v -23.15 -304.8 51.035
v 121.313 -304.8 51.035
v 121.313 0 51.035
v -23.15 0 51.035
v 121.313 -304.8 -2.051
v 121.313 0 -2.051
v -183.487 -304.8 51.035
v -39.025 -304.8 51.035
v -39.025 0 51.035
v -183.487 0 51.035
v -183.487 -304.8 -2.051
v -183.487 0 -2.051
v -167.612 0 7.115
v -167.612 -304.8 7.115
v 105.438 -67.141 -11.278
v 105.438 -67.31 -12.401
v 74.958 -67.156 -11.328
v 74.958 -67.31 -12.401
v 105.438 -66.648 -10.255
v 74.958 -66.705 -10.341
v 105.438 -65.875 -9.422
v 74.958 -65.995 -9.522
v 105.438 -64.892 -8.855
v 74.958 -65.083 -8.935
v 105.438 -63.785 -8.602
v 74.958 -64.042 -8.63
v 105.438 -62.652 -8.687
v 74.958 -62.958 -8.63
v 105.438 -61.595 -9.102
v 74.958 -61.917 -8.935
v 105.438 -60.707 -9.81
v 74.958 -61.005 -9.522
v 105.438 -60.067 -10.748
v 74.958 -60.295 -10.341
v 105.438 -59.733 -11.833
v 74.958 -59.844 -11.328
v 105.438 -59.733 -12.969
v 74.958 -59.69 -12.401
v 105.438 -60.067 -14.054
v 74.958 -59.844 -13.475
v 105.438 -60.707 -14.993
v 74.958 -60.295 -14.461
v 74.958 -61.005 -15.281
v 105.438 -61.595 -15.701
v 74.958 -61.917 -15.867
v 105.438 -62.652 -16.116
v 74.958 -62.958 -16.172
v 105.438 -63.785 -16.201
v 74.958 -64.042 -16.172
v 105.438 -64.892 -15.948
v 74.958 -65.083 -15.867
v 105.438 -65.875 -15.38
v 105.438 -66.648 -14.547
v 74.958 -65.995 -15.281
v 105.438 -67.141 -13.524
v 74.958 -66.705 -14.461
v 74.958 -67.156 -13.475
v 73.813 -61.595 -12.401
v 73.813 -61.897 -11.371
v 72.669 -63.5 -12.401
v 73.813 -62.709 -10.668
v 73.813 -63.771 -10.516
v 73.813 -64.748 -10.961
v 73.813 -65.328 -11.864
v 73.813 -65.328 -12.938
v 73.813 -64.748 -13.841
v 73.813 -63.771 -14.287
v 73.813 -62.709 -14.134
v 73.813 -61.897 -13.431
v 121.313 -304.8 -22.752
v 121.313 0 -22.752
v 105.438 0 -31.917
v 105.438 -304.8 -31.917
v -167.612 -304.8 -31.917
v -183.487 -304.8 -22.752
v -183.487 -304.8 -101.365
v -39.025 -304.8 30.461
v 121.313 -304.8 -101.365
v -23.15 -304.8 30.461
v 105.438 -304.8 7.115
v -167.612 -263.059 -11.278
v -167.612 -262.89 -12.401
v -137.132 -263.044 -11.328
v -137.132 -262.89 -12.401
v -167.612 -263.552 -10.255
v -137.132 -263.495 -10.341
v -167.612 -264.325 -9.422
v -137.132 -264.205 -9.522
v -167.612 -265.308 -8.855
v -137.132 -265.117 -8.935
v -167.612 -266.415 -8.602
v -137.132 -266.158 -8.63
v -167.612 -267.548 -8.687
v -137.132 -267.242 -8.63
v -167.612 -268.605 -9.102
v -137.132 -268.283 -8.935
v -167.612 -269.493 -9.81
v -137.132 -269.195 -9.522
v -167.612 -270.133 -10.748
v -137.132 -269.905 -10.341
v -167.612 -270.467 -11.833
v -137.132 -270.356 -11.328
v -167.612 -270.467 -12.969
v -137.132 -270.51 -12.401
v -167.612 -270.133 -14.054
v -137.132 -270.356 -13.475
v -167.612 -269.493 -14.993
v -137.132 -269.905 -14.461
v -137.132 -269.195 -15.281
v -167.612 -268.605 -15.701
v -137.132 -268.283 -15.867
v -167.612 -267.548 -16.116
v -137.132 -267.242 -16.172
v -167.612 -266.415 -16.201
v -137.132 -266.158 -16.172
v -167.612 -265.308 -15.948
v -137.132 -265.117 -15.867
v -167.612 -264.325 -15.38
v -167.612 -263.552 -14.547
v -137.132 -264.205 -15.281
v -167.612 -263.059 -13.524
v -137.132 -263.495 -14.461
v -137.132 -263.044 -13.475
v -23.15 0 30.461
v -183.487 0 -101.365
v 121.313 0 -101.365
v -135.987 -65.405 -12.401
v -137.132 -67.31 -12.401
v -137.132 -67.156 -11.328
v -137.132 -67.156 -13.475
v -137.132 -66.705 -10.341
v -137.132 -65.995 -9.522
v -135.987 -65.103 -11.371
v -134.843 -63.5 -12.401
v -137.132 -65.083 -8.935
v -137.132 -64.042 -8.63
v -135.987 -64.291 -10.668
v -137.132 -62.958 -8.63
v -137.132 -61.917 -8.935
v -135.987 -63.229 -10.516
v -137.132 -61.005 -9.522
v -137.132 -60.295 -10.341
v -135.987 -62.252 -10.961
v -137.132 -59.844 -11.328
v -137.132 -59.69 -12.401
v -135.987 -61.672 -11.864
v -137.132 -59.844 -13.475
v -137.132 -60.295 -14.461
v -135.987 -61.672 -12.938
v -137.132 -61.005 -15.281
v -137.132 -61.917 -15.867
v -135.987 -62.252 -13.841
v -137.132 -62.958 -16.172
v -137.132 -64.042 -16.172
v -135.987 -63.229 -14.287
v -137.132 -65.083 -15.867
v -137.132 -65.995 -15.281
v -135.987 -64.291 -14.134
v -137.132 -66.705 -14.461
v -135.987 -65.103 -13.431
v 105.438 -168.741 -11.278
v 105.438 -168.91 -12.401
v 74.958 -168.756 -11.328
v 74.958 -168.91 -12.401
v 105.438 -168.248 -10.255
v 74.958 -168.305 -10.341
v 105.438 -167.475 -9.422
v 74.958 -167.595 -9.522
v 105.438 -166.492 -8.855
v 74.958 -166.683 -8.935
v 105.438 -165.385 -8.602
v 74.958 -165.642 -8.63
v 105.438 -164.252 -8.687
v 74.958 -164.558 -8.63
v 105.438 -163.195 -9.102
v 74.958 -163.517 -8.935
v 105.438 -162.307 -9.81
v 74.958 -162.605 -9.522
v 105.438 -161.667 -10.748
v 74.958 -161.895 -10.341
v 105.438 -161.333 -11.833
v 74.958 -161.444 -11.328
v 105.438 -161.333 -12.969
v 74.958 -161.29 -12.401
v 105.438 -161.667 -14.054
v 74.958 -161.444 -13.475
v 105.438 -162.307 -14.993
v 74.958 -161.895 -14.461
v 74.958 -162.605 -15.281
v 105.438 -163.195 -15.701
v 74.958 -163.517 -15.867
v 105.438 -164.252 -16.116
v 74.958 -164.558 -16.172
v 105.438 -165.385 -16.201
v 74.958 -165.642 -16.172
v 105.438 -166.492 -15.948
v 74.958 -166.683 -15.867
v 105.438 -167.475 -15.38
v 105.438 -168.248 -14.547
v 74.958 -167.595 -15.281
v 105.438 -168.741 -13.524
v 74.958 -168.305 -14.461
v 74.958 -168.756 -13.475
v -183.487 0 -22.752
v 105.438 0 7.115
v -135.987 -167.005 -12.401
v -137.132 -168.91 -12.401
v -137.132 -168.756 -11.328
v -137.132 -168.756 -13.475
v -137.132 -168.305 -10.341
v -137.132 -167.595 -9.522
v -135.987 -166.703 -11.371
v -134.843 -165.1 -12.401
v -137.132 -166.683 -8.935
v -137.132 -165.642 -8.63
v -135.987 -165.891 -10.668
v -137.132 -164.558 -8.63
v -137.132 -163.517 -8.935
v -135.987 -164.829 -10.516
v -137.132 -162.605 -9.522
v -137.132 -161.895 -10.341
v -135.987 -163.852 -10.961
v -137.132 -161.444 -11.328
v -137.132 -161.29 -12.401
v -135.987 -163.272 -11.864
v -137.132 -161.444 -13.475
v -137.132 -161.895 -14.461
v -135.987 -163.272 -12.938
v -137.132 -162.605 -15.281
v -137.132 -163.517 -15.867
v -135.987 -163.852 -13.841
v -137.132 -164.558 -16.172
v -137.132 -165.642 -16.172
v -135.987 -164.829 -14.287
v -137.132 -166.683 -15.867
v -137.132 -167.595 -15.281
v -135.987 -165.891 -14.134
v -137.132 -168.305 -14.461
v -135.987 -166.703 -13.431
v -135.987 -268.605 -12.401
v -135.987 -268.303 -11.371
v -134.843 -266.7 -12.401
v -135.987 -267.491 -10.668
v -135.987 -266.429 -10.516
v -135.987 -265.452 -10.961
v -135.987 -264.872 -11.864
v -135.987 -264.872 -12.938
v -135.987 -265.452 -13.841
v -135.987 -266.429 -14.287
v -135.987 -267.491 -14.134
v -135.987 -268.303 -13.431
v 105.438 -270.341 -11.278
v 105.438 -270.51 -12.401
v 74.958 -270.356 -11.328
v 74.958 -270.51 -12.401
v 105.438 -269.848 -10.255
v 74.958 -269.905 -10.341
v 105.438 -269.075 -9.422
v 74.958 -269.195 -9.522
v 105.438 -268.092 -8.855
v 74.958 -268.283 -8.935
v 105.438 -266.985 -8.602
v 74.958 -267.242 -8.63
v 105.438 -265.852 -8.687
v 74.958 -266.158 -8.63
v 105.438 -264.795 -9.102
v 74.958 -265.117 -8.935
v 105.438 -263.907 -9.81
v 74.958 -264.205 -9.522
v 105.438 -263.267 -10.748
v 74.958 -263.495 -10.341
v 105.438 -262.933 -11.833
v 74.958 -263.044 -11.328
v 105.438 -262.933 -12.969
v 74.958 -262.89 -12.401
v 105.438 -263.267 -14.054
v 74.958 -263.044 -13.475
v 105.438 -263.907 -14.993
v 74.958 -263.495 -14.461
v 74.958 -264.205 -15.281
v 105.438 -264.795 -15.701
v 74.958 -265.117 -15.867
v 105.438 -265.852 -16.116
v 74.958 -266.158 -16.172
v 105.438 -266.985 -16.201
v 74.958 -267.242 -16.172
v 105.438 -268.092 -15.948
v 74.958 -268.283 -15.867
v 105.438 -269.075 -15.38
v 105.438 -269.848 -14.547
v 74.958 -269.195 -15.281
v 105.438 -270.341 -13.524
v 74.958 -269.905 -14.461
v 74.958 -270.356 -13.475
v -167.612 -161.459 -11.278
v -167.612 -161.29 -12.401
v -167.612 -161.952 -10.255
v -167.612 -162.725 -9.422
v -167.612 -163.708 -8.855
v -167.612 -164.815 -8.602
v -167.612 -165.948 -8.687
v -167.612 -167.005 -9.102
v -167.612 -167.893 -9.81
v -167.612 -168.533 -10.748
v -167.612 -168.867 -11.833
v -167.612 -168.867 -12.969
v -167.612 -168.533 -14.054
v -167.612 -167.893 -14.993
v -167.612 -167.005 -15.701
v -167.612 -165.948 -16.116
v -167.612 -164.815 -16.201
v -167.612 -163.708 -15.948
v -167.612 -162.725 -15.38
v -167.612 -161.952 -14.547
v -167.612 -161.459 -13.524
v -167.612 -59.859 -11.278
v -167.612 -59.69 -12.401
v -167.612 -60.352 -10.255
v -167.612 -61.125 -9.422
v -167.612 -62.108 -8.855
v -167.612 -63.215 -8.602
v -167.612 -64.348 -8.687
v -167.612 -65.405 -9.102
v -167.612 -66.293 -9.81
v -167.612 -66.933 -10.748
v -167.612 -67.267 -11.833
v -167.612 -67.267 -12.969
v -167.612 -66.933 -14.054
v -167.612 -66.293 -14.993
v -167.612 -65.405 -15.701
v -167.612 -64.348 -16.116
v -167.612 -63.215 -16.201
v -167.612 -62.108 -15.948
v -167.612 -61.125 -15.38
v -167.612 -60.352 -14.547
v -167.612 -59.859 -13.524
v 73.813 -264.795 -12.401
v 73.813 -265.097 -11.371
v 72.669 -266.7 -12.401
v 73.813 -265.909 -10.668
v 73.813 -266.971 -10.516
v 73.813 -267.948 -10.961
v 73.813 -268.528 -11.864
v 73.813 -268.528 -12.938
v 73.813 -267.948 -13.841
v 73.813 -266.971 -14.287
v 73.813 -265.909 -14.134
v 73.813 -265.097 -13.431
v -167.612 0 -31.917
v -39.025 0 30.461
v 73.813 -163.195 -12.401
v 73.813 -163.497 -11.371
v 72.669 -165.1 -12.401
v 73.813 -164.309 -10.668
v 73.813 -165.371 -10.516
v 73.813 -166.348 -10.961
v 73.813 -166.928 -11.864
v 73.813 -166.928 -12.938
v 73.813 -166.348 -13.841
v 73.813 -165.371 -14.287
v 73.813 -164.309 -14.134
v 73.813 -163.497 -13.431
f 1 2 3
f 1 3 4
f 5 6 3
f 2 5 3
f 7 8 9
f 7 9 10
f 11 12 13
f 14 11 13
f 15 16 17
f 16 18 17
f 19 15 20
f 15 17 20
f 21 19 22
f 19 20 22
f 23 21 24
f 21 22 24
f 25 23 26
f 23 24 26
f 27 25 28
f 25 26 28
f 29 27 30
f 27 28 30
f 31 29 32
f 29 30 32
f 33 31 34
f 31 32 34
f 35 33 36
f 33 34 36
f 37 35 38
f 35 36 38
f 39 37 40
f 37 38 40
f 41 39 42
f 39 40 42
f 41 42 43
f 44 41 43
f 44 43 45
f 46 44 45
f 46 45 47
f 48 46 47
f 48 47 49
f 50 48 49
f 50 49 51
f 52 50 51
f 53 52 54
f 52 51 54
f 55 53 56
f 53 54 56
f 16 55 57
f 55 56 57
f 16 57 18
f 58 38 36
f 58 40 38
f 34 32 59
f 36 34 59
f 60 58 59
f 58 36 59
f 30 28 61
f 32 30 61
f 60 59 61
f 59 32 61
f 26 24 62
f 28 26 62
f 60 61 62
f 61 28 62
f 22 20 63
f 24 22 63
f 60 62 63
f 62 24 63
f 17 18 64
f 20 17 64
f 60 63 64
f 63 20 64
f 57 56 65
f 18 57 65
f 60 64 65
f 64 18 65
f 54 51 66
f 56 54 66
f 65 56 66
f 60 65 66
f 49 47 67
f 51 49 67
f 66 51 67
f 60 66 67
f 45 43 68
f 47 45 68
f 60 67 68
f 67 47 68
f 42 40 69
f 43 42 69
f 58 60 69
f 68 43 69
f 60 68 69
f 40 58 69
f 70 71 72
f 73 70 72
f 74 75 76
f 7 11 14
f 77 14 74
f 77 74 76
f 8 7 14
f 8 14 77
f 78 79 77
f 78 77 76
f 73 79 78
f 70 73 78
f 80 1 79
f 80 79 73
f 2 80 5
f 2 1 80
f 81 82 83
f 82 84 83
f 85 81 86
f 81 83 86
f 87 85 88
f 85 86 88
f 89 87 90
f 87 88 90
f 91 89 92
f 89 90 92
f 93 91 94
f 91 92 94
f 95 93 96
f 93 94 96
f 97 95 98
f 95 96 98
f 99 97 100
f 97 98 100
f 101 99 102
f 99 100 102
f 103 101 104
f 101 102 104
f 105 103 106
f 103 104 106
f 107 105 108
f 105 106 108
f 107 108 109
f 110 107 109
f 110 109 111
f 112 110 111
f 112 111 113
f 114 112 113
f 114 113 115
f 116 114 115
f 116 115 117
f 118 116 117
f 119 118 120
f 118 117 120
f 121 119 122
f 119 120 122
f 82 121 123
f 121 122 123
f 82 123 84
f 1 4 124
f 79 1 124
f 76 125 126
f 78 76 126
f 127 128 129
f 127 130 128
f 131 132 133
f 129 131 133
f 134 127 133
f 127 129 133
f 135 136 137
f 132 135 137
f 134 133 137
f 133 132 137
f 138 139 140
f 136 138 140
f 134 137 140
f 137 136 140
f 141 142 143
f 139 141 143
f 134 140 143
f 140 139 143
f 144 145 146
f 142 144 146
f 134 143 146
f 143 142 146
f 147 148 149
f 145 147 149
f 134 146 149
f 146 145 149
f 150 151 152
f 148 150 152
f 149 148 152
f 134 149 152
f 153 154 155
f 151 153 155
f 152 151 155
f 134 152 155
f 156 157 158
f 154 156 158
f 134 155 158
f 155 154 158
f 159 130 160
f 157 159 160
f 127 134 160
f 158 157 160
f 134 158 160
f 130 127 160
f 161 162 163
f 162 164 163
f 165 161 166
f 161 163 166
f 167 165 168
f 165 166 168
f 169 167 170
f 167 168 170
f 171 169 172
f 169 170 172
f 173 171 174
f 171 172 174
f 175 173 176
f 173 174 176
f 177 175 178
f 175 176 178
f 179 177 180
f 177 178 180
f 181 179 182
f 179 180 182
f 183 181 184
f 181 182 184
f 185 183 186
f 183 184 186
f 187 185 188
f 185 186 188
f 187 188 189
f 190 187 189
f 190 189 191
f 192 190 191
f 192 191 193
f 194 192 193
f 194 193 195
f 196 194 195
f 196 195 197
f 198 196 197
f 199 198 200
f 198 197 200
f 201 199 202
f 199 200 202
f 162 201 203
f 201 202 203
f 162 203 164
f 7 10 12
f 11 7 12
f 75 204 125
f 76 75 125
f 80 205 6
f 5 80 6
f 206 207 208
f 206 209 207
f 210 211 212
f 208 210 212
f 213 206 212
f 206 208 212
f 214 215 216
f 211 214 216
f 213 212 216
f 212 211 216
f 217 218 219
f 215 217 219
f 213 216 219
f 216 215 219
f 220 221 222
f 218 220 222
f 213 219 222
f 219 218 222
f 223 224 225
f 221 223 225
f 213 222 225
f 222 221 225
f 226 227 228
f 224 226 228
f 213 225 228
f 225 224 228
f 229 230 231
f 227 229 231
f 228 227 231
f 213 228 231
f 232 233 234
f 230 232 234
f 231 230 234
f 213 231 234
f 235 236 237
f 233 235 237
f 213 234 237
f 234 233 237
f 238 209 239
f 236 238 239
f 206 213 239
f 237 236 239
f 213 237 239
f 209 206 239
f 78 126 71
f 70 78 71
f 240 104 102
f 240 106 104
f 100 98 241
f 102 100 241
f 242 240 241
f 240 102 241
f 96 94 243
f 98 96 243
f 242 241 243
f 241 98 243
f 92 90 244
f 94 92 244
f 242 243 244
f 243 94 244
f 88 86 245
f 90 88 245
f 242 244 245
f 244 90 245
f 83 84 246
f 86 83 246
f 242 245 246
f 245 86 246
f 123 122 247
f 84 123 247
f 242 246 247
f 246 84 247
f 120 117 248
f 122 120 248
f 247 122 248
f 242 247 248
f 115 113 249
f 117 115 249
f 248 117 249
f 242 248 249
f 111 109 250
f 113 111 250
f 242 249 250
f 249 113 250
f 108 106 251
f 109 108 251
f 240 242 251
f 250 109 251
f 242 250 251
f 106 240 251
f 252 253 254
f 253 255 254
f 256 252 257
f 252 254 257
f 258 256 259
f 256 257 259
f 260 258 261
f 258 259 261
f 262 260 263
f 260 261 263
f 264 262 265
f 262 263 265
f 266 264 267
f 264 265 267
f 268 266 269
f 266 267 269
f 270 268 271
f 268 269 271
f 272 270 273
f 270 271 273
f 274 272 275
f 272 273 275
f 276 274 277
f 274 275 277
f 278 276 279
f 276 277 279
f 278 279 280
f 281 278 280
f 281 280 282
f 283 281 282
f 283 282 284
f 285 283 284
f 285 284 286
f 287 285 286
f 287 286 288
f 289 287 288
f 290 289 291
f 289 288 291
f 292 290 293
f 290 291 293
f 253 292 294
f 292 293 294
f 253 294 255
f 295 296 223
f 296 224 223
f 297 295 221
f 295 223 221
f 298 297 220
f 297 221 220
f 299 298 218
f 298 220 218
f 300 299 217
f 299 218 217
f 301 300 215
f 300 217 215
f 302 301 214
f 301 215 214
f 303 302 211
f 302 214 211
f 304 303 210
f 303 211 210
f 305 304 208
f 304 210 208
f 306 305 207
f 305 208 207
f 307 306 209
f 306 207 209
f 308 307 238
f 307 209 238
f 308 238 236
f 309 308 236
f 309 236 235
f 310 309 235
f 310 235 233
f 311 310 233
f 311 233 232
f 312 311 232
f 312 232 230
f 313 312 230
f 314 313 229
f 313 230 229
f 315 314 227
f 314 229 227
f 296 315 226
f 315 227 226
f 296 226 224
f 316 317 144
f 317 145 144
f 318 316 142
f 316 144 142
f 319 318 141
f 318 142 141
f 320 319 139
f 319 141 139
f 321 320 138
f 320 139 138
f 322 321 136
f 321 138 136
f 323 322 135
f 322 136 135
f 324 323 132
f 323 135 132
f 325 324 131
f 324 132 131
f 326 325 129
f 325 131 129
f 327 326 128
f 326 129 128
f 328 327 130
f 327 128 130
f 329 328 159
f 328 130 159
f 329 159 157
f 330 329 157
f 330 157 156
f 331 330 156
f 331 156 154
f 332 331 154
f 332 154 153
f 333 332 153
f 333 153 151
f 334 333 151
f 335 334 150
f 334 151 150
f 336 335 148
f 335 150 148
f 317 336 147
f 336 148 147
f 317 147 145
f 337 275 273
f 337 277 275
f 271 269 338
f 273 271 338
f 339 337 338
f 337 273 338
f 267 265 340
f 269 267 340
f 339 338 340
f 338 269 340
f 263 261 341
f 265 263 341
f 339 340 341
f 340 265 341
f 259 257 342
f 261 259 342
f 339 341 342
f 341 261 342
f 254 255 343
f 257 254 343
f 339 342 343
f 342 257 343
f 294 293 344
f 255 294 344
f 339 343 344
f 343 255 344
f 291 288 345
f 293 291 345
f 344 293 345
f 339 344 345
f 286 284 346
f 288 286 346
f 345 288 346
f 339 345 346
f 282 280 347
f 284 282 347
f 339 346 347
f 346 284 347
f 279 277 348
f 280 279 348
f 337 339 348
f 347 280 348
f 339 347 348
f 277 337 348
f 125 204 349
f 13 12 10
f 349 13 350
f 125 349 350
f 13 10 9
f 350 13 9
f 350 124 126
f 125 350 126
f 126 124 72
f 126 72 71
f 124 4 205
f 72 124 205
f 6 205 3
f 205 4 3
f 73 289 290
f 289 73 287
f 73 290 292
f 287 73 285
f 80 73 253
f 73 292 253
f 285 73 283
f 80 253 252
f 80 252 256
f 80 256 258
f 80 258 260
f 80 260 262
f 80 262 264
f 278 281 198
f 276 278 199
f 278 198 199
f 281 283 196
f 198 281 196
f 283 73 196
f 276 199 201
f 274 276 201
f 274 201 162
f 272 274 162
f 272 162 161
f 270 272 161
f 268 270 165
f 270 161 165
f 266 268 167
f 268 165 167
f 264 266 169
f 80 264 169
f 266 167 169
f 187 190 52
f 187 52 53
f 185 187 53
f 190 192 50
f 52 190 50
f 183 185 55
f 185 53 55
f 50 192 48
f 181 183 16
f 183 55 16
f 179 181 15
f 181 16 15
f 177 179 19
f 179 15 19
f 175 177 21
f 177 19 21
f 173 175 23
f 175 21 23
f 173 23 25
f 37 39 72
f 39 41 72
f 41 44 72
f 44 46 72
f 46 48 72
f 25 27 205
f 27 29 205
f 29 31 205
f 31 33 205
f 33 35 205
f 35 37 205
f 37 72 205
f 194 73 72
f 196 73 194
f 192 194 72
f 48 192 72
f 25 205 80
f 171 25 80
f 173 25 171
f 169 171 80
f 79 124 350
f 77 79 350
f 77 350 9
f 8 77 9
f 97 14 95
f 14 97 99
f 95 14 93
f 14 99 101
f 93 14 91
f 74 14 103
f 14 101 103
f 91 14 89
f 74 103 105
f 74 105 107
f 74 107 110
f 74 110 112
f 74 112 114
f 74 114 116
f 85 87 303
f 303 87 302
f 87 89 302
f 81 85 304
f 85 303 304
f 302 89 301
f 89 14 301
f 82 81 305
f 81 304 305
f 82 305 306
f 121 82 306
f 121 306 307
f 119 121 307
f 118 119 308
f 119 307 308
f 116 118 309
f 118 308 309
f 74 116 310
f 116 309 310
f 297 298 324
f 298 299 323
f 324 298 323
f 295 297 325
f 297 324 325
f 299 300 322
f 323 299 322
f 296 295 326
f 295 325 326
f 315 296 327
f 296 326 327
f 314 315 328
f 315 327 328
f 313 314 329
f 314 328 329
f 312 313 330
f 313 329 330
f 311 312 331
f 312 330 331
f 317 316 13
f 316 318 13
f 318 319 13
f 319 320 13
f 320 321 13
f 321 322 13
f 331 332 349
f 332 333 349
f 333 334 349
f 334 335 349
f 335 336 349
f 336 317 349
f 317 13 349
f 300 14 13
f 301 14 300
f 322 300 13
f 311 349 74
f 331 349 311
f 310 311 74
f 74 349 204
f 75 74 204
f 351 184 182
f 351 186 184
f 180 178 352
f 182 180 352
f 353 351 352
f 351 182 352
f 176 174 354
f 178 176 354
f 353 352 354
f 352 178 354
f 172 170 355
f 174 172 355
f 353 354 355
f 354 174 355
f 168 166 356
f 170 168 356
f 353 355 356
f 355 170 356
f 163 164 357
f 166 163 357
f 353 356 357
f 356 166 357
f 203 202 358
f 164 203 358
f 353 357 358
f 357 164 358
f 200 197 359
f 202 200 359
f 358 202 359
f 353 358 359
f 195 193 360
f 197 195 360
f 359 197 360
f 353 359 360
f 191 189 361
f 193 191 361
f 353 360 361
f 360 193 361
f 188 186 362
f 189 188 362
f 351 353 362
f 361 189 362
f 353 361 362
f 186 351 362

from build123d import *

# Parameters (mm, degrees)
F1_DEPTH = 304.8
F4_D     = 7.62
F4_DEPTH = 30.48
F4_TIP   = 2.2892789585
F5_D     = 7.62
F5_DEPTH = 30.48
F5_TIP   = 2.2892789585


with BuildPart() as f1:
    # F0 (on Front) → F1 (new body)
    with BuildSketch(Plane.XZ):
        Polygon((-39.024540448, 51.035306699), (-183.487040448, 51.035306699), (-183.487040448, -2.050693301), (-167.612040448, 7.1147422224), (-167.612040448, -31.9171288244), (-183.487040448, -22.751693301), (-183.487040448, -101.364693301), (-31.087040448, -101.364693301), (-31.087040448, 30.461306699), (-39.024540448, 30.461306699), align=None)
        Polygon((-23.149540448, 30.461306699), (-31.087040448, 30.461306699), (-31.087040448, -101.364693301), (121.312959552, -101.364693301), (121.312959552, -22.751693301), (105.437959552, -31.9171288244), (105.437959552, 7.1147422224), (121.312959552, -2.050693301), (121.312959552, 51.035306699), (-23.149540448, 51.035306699), align=None)
    extrude(amount=F1_DEPTH)

    # F4
    with Locations(Plane.YZ.offset(105.437959552)):
        with Locations((-63.5, -12.401193301), (-165.1, -12.401193301), (-266.7, -12.401193301)):
            Hole(F4_D / 2, depth=F4_DEPTH)
            with Locations((0, 0, -(F4_DEPTH + F4_TIP / 2))):  # 118° drill point
                Cone(0, F4_D / 2, F4_TIP, mode=Mode.SUBTRACT)

    # F5
    with Locations(Plane(origin=(-167.612040448, 0, 0), x_dir=(0, -1, 0), z_dir=(-1, 0, 0))):
        with Locations((63.5, -12.401193301), (165.1, -12.401193301), (266.7, -12.401193301)):
            Hole(F5_D / 2, depth=F5_DEPTH)
            with Locations((0, 0, -(F5_DEPTH + F5_TIP / 2))):  # 118° drill point
                Cone(0, F5_D / 2, F5_TIP, mode=Mode.SUBTRACT)


solid = f1.part
